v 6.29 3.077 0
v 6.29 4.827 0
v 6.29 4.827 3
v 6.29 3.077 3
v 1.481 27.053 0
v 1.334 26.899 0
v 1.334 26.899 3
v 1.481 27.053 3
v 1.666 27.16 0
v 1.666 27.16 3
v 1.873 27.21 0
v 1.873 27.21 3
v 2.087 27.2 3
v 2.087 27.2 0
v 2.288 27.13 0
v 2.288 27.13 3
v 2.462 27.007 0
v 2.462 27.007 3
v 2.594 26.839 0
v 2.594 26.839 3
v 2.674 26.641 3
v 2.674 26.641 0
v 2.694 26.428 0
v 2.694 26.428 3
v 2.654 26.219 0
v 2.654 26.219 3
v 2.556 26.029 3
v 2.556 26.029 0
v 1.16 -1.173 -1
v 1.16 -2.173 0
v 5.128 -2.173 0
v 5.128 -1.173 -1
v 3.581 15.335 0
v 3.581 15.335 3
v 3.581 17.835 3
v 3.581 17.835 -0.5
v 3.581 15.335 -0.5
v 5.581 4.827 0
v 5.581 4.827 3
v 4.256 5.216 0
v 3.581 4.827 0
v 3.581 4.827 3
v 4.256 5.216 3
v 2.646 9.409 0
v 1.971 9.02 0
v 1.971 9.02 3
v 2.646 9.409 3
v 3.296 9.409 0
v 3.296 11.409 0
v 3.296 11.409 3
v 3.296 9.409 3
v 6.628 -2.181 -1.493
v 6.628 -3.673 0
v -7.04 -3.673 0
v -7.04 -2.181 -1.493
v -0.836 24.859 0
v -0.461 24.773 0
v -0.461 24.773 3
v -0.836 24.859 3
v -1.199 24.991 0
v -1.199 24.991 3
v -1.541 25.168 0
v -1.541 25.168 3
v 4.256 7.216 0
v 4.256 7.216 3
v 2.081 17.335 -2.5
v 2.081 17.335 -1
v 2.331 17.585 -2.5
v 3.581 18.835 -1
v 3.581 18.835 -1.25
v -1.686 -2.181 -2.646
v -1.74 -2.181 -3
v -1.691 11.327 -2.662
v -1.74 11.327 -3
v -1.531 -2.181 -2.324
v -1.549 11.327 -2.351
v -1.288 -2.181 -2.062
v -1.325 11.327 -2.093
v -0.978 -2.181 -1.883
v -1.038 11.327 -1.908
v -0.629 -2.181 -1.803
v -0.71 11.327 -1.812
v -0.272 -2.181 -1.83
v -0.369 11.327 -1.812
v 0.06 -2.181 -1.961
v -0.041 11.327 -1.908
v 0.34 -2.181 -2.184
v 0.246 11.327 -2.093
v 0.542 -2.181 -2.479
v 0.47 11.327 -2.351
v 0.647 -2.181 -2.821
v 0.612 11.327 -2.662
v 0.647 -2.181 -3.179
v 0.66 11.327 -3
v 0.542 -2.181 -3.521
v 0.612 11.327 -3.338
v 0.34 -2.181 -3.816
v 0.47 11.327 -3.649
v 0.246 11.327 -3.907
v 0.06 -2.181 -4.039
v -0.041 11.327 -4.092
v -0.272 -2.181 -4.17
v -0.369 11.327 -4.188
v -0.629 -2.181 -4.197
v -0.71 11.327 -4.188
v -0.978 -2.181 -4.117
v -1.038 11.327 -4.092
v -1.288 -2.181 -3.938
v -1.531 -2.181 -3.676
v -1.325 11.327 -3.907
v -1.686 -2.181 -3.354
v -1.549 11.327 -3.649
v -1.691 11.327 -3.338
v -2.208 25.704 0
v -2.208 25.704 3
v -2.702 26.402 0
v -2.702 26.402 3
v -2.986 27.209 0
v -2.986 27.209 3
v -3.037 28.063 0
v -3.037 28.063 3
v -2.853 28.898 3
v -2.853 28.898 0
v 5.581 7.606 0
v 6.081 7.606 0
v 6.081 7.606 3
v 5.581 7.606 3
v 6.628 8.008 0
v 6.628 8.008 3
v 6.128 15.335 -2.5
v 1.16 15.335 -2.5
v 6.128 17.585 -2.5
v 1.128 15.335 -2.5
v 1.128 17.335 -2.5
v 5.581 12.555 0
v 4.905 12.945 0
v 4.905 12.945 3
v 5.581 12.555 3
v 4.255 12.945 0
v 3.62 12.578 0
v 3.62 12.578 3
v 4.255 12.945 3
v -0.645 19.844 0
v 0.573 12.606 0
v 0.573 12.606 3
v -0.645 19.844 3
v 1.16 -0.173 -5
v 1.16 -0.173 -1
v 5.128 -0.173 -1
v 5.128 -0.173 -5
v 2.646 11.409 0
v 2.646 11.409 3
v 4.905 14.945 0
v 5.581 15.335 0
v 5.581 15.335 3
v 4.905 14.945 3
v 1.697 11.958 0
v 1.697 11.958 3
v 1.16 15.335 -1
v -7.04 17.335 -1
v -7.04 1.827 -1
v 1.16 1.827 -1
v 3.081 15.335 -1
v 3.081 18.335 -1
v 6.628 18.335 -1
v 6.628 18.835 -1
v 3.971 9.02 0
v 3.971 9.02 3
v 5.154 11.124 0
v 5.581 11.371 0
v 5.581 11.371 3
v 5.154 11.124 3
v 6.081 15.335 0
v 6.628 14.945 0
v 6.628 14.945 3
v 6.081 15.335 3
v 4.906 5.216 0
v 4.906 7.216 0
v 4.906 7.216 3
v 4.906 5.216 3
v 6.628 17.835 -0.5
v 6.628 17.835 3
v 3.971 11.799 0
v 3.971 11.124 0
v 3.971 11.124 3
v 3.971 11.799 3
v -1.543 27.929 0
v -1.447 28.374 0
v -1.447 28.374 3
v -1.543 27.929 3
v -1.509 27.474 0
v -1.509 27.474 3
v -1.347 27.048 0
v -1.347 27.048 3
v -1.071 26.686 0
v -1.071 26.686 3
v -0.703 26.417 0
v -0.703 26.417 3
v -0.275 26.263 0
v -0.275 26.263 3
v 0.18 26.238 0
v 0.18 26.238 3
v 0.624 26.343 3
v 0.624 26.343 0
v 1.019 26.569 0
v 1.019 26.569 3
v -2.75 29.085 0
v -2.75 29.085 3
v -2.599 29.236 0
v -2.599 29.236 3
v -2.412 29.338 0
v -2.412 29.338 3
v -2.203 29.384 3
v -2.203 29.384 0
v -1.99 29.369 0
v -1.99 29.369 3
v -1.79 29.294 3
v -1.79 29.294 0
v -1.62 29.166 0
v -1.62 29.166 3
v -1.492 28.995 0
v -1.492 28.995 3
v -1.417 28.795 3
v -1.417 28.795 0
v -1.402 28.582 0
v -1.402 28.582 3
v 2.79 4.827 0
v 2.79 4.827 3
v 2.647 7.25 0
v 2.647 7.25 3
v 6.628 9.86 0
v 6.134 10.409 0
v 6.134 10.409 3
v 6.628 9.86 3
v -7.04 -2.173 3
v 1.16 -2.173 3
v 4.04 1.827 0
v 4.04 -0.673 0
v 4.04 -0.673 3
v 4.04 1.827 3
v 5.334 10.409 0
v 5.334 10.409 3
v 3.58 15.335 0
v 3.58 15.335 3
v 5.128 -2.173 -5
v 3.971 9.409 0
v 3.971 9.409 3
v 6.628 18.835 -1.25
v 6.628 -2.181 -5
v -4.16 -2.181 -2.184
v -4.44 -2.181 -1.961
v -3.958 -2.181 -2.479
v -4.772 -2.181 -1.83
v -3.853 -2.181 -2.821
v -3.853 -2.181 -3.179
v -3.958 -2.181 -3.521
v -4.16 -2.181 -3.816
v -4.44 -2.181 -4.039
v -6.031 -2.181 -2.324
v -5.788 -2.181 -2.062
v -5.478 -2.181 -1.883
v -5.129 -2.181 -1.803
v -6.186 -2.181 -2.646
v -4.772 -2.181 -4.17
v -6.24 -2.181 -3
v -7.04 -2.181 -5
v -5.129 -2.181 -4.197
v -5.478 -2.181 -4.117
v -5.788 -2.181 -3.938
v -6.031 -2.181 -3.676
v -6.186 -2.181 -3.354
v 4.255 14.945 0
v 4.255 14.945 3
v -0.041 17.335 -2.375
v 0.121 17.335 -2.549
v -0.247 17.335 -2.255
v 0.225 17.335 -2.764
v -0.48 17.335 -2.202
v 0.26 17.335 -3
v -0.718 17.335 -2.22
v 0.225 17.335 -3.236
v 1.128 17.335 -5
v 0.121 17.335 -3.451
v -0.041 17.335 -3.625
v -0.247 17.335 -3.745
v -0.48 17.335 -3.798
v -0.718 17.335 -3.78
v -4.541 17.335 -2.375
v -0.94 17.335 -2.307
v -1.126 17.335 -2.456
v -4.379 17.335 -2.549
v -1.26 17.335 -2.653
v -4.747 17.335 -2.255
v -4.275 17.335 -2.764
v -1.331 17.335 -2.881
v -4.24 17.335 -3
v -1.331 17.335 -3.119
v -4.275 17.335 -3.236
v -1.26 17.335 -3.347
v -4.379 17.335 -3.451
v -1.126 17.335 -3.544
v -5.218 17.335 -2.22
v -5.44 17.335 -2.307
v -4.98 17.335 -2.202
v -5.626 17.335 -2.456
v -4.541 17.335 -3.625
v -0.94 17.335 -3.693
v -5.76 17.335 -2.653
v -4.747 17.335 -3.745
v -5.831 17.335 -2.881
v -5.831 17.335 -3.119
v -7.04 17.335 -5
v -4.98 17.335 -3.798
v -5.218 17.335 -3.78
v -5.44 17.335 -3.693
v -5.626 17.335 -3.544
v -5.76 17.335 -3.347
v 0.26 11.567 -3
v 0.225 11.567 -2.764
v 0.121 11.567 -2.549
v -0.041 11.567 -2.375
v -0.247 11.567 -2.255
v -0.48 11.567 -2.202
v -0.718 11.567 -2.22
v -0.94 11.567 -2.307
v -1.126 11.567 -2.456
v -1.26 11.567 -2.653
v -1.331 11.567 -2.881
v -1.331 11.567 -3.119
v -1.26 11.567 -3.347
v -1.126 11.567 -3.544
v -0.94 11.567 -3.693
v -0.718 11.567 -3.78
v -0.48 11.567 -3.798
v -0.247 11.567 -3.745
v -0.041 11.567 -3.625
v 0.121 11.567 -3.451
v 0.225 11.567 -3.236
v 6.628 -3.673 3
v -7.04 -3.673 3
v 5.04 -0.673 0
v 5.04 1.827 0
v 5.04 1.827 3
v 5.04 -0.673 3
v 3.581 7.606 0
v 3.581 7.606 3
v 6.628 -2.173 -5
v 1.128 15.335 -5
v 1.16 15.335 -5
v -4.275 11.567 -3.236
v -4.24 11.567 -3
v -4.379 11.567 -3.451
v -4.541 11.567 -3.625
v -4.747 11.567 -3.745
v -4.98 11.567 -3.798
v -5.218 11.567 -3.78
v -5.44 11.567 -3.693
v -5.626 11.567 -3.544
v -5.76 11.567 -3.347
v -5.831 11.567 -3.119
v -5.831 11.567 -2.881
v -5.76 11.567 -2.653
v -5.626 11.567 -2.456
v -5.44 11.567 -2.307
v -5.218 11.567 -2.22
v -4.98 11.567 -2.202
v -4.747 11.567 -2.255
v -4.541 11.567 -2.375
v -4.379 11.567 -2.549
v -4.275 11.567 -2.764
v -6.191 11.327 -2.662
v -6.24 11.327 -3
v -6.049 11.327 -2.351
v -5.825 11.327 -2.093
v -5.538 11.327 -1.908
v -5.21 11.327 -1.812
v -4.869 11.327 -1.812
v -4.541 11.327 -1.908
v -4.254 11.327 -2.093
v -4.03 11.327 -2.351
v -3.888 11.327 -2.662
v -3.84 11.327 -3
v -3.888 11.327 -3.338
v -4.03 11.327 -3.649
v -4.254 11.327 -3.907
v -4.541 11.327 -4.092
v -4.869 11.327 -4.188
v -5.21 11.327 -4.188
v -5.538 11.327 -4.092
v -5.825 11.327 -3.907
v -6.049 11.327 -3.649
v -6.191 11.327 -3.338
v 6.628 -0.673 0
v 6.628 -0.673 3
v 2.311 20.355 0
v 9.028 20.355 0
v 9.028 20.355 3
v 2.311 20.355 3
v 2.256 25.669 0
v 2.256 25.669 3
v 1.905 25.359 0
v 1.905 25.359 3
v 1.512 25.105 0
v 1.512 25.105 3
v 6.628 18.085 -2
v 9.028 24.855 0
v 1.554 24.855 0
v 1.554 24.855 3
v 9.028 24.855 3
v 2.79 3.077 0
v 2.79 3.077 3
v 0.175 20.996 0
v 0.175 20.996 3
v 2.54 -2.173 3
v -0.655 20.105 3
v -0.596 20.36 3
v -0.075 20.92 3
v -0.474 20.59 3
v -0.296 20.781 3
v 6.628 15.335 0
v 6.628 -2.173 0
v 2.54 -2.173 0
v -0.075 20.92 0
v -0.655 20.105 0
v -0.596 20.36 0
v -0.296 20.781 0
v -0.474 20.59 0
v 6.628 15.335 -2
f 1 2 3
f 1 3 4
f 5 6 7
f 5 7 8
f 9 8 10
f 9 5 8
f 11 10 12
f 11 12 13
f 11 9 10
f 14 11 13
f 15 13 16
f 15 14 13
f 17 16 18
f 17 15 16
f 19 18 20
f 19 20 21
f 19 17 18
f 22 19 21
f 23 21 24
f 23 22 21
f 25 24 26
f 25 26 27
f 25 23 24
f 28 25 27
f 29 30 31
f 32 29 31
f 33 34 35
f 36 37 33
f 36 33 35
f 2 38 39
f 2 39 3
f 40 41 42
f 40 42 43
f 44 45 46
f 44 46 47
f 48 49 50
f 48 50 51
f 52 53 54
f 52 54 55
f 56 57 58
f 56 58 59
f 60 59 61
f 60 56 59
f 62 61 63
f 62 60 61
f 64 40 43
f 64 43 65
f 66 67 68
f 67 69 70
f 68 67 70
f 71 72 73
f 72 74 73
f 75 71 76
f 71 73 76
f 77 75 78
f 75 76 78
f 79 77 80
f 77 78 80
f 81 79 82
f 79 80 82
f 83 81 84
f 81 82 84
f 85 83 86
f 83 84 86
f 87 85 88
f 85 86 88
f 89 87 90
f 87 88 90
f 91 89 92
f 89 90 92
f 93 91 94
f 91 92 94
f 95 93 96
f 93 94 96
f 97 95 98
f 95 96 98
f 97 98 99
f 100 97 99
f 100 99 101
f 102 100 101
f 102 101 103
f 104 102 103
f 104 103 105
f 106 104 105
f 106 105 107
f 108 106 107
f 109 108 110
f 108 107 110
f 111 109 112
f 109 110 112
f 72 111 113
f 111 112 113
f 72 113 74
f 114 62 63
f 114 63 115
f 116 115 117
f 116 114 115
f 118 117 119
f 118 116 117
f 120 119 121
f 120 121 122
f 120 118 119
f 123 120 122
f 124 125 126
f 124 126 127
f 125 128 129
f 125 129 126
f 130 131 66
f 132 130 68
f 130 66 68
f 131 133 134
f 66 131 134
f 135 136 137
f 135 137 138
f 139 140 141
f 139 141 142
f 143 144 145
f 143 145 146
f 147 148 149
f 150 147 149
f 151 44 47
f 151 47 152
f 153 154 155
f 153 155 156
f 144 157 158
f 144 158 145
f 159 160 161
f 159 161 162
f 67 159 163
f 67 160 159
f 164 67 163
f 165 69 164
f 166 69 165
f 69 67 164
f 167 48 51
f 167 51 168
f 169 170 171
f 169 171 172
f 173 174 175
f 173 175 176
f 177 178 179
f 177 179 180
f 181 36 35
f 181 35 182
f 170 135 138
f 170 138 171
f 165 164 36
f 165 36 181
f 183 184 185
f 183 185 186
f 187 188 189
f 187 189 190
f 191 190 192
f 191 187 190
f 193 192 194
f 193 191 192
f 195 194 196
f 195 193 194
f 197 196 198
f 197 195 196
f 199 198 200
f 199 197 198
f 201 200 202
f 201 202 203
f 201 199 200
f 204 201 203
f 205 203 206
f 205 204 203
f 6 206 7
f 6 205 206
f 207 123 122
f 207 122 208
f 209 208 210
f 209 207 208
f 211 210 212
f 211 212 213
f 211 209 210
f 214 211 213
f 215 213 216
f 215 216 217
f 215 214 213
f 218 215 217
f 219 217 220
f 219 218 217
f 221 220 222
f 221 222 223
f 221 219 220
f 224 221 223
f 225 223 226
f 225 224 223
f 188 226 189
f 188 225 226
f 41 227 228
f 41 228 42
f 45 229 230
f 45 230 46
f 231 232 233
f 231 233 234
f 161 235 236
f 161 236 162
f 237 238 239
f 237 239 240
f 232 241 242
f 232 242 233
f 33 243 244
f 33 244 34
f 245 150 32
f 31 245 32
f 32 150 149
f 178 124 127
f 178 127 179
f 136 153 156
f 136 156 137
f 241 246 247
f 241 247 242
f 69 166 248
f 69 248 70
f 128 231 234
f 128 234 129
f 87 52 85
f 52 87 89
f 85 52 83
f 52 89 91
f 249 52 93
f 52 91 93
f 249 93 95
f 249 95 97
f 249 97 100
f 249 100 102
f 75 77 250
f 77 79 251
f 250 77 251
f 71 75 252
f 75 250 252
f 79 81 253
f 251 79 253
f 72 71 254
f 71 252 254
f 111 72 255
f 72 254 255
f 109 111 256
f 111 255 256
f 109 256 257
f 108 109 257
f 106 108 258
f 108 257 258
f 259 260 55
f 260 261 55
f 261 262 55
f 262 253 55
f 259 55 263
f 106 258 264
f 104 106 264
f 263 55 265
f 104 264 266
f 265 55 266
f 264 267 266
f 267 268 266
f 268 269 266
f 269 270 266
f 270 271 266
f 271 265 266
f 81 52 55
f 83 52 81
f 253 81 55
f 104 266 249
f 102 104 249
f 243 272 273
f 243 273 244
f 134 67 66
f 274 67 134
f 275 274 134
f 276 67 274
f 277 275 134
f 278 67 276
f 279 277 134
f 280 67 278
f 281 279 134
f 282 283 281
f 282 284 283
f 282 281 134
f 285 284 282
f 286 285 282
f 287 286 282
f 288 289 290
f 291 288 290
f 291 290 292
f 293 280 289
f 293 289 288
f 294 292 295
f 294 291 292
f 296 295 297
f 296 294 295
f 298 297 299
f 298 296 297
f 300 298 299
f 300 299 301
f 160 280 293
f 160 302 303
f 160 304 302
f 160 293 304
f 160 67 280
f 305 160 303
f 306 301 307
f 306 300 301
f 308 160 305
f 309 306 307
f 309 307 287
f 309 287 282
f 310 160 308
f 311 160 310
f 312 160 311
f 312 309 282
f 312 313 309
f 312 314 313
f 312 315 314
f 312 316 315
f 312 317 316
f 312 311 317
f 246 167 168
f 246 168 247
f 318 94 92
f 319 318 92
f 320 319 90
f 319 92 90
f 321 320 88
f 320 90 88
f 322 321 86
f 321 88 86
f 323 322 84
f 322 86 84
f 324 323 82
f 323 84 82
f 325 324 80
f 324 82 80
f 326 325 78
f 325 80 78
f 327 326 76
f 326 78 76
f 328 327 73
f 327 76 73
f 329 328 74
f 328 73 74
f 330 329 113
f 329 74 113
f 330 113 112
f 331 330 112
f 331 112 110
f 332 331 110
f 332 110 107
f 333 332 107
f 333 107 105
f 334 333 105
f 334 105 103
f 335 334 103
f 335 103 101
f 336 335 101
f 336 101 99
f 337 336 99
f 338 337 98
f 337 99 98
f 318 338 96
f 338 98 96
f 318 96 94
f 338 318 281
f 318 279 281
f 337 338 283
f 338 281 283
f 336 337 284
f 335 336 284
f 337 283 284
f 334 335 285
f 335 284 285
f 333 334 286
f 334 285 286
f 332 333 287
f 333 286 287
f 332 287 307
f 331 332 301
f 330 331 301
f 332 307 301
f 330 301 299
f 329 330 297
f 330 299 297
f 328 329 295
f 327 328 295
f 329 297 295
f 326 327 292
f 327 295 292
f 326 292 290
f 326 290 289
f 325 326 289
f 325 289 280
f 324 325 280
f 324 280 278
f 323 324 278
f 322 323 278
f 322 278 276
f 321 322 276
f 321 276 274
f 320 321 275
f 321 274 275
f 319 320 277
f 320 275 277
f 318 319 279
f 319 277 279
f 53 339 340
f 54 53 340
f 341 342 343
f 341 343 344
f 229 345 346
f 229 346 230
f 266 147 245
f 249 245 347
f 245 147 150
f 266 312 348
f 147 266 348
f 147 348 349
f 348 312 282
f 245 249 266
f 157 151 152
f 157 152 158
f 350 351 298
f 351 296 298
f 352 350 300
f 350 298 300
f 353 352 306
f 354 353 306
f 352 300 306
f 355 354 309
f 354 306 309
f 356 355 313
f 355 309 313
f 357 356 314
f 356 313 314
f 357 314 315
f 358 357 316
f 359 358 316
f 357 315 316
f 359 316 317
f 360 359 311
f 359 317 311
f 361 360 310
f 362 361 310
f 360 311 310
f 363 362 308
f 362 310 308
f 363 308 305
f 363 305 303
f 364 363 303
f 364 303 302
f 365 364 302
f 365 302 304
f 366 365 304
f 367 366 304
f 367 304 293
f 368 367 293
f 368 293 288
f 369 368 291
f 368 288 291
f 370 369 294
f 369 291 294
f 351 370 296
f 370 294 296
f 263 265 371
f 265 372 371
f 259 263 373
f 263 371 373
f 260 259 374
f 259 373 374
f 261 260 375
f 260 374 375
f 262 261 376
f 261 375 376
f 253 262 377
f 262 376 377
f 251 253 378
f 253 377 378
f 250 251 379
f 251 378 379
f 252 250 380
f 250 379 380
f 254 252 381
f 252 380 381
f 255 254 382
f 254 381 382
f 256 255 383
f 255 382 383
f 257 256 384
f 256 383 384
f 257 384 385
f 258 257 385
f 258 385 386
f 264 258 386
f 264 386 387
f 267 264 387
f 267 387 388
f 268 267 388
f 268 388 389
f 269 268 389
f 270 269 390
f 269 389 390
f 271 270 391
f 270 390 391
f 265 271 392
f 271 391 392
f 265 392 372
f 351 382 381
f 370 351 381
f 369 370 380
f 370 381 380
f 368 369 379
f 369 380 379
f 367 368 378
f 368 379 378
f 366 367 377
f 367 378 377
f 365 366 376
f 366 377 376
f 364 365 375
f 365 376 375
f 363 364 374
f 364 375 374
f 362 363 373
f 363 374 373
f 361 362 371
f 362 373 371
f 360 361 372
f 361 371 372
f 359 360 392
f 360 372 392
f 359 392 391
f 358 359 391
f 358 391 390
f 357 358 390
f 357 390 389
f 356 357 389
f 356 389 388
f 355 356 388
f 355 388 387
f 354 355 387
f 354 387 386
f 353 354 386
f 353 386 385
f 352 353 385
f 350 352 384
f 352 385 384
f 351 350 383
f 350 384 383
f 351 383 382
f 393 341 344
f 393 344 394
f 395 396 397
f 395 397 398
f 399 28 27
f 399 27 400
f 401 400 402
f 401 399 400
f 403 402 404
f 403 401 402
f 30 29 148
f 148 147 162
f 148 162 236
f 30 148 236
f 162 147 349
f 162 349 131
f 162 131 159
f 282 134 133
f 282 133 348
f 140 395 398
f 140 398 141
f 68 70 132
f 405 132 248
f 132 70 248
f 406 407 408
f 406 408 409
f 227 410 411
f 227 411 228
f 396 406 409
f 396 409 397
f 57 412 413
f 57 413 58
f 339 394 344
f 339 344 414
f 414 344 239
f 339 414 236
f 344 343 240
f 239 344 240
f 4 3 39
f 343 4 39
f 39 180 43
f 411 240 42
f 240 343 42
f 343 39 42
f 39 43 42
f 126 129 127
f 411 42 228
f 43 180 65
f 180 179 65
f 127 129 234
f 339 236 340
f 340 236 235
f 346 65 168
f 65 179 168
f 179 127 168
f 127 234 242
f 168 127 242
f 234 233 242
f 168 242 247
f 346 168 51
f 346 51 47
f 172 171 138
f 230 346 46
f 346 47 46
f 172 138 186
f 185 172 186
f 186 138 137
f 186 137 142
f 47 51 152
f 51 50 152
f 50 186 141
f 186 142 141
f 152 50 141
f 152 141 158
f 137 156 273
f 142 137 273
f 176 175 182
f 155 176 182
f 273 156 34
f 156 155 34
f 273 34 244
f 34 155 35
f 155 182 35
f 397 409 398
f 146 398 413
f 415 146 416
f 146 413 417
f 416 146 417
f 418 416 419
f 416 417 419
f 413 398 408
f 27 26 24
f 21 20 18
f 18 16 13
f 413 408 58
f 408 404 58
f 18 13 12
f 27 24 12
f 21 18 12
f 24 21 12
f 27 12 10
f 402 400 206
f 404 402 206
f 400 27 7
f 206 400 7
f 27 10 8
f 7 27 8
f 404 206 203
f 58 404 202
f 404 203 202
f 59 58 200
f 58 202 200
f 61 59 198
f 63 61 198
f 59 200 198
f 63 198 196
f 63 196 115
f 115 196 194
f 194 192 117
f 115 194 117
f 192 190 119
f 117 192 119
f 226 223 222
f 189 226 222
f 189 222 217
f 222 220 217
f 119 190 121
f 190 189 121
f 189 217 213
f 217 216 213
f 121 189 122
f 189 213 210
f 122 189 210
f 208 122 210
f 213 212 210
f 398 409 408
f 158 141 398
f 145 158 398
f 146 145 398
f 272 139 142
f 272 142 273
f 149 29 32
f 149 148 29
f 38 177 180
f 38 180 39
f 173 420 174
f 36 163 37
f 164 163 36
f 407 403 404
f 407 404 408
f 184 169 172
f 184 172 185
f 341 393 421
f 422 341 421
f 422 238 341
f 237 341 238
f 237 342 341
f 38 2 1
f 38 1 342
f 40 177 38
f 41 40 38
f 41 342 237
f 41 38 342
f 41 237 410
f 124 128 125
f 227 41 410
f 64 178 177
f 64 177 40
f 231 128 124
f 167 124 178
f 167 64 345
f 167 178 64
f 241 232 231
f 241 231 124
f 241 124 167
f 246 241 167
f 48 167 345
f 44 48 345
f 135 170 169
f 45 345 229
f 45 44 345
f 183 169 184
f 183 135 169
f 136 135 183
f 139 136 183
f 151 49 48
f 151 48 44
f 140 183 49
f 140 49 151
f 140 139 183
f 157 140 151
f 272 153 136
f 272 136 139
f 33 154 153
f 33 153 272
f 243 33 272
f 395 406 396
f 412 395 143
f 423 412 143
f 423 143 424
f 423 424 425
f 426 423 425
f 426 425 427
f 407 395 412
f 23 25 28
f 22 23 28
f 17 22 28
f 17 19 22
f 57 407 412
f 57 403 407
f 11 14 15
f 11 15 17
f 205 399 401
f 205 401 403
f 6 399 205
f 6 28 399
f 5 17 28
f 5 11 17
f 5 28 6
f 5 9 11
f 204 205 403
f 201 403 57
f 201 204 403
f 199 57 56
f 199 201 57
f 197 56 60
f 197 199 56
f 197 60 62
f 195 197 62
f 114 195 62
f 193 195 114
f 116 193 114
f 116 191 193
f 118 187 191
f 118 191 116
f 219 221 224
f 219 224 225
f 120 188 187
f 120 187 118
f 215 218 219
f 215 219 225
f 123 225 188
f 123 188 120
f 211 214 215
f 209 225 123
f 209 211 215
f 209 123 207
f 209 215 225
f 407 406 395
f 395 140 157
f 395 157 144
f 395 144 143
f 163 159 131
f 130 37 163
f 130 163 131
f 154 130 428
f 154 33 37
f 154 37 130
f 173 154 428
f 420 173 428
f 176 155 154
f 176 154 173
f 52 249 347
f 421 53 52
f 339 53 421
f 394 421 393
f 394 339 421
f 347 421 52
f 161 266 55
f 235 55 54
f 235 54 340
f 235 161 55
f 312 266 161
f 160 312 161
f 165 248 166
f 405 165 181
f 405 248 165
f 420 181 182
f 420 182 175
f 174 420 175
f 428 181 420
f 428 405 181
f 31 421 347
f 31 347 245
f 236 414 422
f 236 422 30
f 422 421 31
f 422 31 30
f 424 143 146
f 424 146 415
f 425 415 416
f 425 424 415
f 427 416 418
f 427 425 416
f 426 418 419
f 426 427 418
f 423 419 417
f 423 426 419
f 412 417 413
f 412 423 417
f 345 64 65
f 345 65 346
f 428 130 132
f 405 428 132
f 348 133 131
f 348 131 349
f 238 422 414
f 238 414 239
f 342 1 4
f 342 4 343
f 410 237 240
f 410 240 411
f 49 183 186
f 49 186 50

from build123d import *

# Parameters (mm, degrees)
BOSS_SWITCH_BODY_DEPTH                    = 3
SKETCH1_W                                 = 4.0875
SKETCH1_H                                 = 1.5
SKETCH1_W_2                               = 3.046903414
SKETCH1_H_2                               = 3.5
BOSS_FLANGE_WIDTH_DEPTH                   = 5
SKETCH2_W                                 = 4
SKETCH2_H                                 = 2
SKETCH2_W_2                               = 8
SKETCH2_H_2                               = 1.5
BOSS_FLANGE_HEIGHT_DEPTH                  = 10.620596586
CUT_UP_TO_DOWN_DERAILLEUR_CLEARANCE_REACH = 23.629
SKETCH10_W                                = 1.5
SKETCH10_H                                = 3
SKETCH17_W                                = 12.1675
SKETCH17_H                                = 4
BOSS_FLANGE_SUPPORT_DEPTH                 = 17.508325141
TAP_DRILL_FOR_M2X0_4_TAP1_D               = 1.6
M2_CLEARANCE_HOLE2_D                      = 2.4
M2_CLEARANCE_HOLE2_DEPTH                  = 15
M2_CLEARANCE_HOLE2_TIP                    = 0.721032743
CHAMFER_FLANGE_SUPPORT_SIZE               = 1.5
CHAMFER_FLANGE_SUPPORT_2_SIZE             = 1.5
SKETCH23_W                                = 7.349718646
SKETCH23_H                                = 15.508325141
CUT_GAP_FOR_PRINTING_DEPTH                = 32.000499688
CUT_WIDE_DERAILLEUR_CLEARANCE_DEPTH       = 33.195879702
CUT_WIDE_DERAILLEUR_CLEARANCE_DEPTH_BACK  = 4
SKETCH27_W                                = 2.5
SKETCH27_H                                = 3.5
CHAMFER9_SIZE                             = 1.25
SKETCH28_W                                = 3.046903414
SKETCH28_H                                = 1
CUT_EXTRUDE1_DEPTH                        = 1
CHAMFER10_SIZE                            = 0.5
CHAMFER_FLANGE_SUPPORT_3_SIZE             = 1
CUT_EXTRUDE2_DEPTH                        = 34.862828732
BOSS_EXTRUDE2_DEPTH                       = 8.2


with BuildPart() as part:
    # Sketch-SwitchBossUp → Boss-Switch Body (new body)
    with BuildSketch(Plane.XY):
        with BuildLine():
            Line((5.581091204, 12.554885442), (5.58109997, 11.370542897))
            Line((5.58109997, 11.370542897), (5.154266051, 11.12411022))
            Line((5.154266051, 11.12411022), (3.971266051, 11.12411022))
            Line((3.971266051, 11.12411022), (3.97126394, 11.79911022))
            Line((3.97126394, 11.79911022), (3.296271341, 11.409403061))
            Line((3.296271341, 11.409403061), (3.296271341, 9.409403061))
            Line((3.296271341, 9.409403061), (3.971278743, 9.019687356))
            Line((3.971278743, 9.019687356), (3.971278743, 9.409408058))
            Line((3.971278743, 9.409408058), (5.333511297, 10.40941814))
            Line((5.333511297, 10.40941814), (6.133511297, 10.409424062))
            Line((6.133511297, 10.409424062), (6.627976927, 9.860264345))
            Line((6.627976927, 9.860264345), (6.627976927, 8.007577878))
            Line((6.627976927, 8.007577878), (6.081127833, 7.606137899))
            Line((6.081127833, 7.606137899), (5.581127833, 7.606137899))
            Line((5.581127833, 7.606137899), (4.906138119, 7.216432406))
            Line((4.906138119, 7.216432406), (4.906138119, 5.216432406))
            Line((4.906138119, 5.216432406), (5.58114552, 4.826716701))
            Line((5.58114552, 4.826716701), (6.290476927, 4.826716701))
            Line((6.290476927, 4.826716701), (6.290476927, 3.076720436))
            Line((6.290476927, 3.076720436), (5.040476927, 1.826720436))
            Line((5.040476927, 1.826720436), (5.040476927, -0.673279564))
            Line((5.040476927, -0.673279564), (6.627976927, -0.673279564))
            Line((6.627976927, -0.673279564), (6.627976927, -3.673279564))
            Line((6.627976927, -3.673279564), (2.540476927, -3.673279564))
            Line((2.540476927, -3.673279564), (2.540476927, -2.173279564))
            Line((2.540476927, -2.173279564), (4.040476927, -0.673279564))
            Line((4.040476927, -0.673279564), (4.040476927, 1.826720436))
            Line((4.040476927, 1.826720436), (2.790476927, 3.076720436))
            Line((2.790476927, 3.076720436), (2.790476927, 4.826720436))
            Line((2.790476927, 4.826720436), (3.58114552, 4.826720436))
            Line((3.58114552, 4.826720436), (4.256138119, 5.216427595))
            Line((4.256138119, 5.216427595), (4.256138119, 7.216427595))
            Line((4.256138119, 7.216427595), (3.581130717, 7.6061433))
            Line((3.581130717, 7.6061433), (2.64686251, 7.249572244))
            Line((2.64686251, 7.249572244), (1.971281627, 9.019692757))
            Line((1.971281627, 9.019692757), (2.646271341, 9.40939825))
            Line((2.646271341, 9.40939825), (2.646271341, 11.40939825))
            Line((2.646271341, 11.40939825), (1.696557212, 11.957715958))
            Line((1.696557212, 11.957715958), (0.573317845, 12.60621851))
            Line((0.573317845, 12.60621851), (-0.645153605, 19.844362607))
            ThreePointArc((-0.645153605, 19.844362607), (-0.473707256, 20.590279886), (0.174966786, 20.996492176))
            Line((0.174966786, 20.996492176), (-0.46073685, 24.772792819))
            ThreePointArc((-0.46073685, 24.772792819), (-1.019582136, 24.919522879), (-1.541303694, 25.167805745))
            ThreePointArc((-1.541303694, 25.167805745), (-2.872284003, 26.795385437), (-2.852546321, 28.897797067))
            ThreePointArc((-2.852546321, 28.897797067), (-1.887813913, 29.338582026), (-1.447028953, 28.373849618))
            ThreePointArc((-1.447028953, 28.373849618), (-0.703448682, 26.416936722), (1.333779254, 26.898727173))
            ThreePointArc((1.333779254, 26.898727173), (2.379722745, 27.074801628), (2.555797201, 26.028858137))
            ThreePointArc((2.555797201, 26.028858137), (2.086504637, 25.507104397), (1.511513111, 25.104801997))
            Line((1.511513111, 25.104801997), (1.553598189, 24.854801997))
            Line((1.553598189, 24.854801997), (9.027976927, 24.854801997))
            Line((9.027976927, 24.854801997), (9.027976927, 22.354801997))
            Line((9.027976927, 22.354801997), (9.027976927, 20.354801997))
            Line((9.027976927, 20.354801997), (2.311129602, 20.354801997))
            Line((2.311129602, 20.354801997), (3.620242387, 12.578216848))
            Line((3.620242387, 12.578216848), (4.255457038, 12.944958198))
            Line((4.255457038, 12.944958198), (4.255457038, 14.944958198))
            Line((4.255457038, 14.944958198), (3.579805878, 15.335045577))
            Line((3.579805878, 15.335045577), (3.581073513, 15.335045577))
            Line((3.581073513, 15.335045577), (3.581073513, 17.835045577))
            Line((3.581073513, 17.835045577), (5.725580434, 17.835045577))
            Line((5.725580434, 17.835045577), (6.627976927, 17.835045577))
            Line((6.627976927, 17.835045577), (6.627976927, 14.94496801))
            Line((6.627976927, 14.94496801), (6.081099865, 15.335045577))
            Line((6.081099865, 15.335045577), (5.581099865, 15.335045577))
            Line((5.581099865, 15.335045577), (4.905457038, 14.944963009))
            Line((4.905457038, 14.944963009), (4.905457038, 12.944963009))
            Line((4.905457038, 12.944963009), (5.581091204, 12.554885442))
        make_face()
    extrude(amount=BOSS_SWITCH_BODY_DEPTH)

    # Sketch1 → Boss-Flange Width (add)
    with BuildSketch(Plane(origin=(0, 0, 0), x_dir=(-1, 0, 0), z_dir=(0, 0, -1))):
        with Locations((-4.584226927, -2.923279564)):
            Rectangle(SKETCH1_W, SKETCH1_H)
        with Locations((-5.10452522, 17.085045577)):
            Rectangle(SKETCH1_W_2, SKETCH1_H_2)
    extrude(amount=BOSS_FLANGE_WIDTH_DEPTH)

    # Sketch2 → Boss-Flange Height (add)
    with BuildSketch(Plane(origin=(-7.039523073, 0, 0), x_dir=(0, 0, -1), z_dir=(1, 0, 0))):
        with Locations((3, 16.335045577)):
            Rectangle(SKETCH2_W, SKETCH2_H)
        with Locations((1, -2.923279564)):
            Rectangle(SKETCH2_W_2, SKETCH2_H_2)
    extrude(amount=BOSS_FLANGE_HEIGHT_DEPTH)

    # Sketch10 → Cut-Up-To-Down Derailleur Clearance (cut, up to next)
    with BuildSketch(Plane(origin=(0, 15.335045577, 0), x_dir=(1, 0, 0), z_dir=(0, 1, 0)), mode=Mode.PRIVATE) as cut_up_to_down_derailleur_clearance_sk1:
        with Locations((5.877976927, 3.5)):
            Rectangle(SKETCH10_W, SKETCH10_H)
    cut_up_to_down_derailleur_clearance_tool1 = extrude(cut_up_to_down_derailleur_clearance_sk1.sketch, amount=CUT_UP_TO_DOWN_DERAILLEUR_CLEARANCE_REACH, mode=Mode.PRIVATE) & part.part
    add(cut_up_to_down_derailleur_clearance_tool1.solids().sort_by_distance((5.877977, 15.335046, -3.5))[0], mode=Mode.SUBTRACT)

    # Sketch17 → Boss-Flange Support (add)
    with BuildSketch(Plane.XZ.offset(-15.335045577)):
        with Locations((-0.955773073, -3)):
            Rectangle(SKETCH17_W, SKETCH17_H)
    extrude(amount=BOSS_FLANGE_SUPPORT_DEPTH)

    # Tap Drill for M2x0.4 Tap1 (through all)
    with Locations(Plane(origin=(0, -3.673279564, 0), x_dir=(-1, 0, 0), z_dir=(0, -1, 0))):
        with Locations((5.039523073, 3), (0.539523073, 3)):
            Hole(TAP_DRILL_FOR_M2X0_4_TAP1_D / 2)

    # M2 Clearance Hole2
    with Locations(Plane.XZ.offset(3.673279564)):
        with Locations((-5.039523073, -3), (-0.539523073, -3)):
            Hole(M2_CLEARANCE_HOLE2_D / 2, depth=M2_CLEARANCE_HOLE2_DEPTH)
            with Locations((0, 0, -(M2_CLEARANCE_HOLE2_DEPTH + M2_CLEARANCE_HOLE2_TIP / 2))):  # 118° drill point
                Cone(0, M2_CLEARANCE_HOLE2_D / 2, M2_CLEARANCE_HOLE2_TIP, mode=Mode.SUBTRACT)

    # Chamfer-Flange Support
    chamfer_flange_support_edges = [part.edges().sort_by_distance(p)[0] for p in [
        (3.581073513, 17.335045577, -3),
    ]]
    chamfer(chamfer_flange_support_edges, length=CHAMFER_FLANGE_SUPPORT_SIZE - 0.0001)  # a hair under: the kernel refuses the full size

    # Chamfer-Flange Support 2
    chamfer_flange_support_2_edges = [part.edges().sort_by_distance(p)[0] for p in [
        (5.127976927, 17.085045577, -2),
        (5.127976927, 15.335045577, -1.5),
    ]]
    chamfer(chamfer_flange_support_2_edges, length=CHAMFER_FLANGE_SUPPORT_2_SIZE - 0.0001)  # a hair under: the kernel refuses the full size

    # Sketch23 → Cut-Gap for Printing (cut, through all)
    with BuildSketch(Plane.XY.offset(-1)):
        with Locations((4.83533625, 7.580883007)):
            Rectangle(SKETCH23_W, SKETCH23_H)
    extrude(amount=-CUT_GAP_FOR_PRINTING_DEPTH, mode=Mode.SUBTRACT)

    # Sketch27 → Cut-Wide Derailleur Clearance (cut, two sides: drawn at the far end of the back side and taken through both)
    with BuildSketch(Plane(origin=(5.127976927, 0, 0), x_dir=(0, 0, -1), z_dir=(1, 0, 0)).offset(-CUT_WIDE_DERAILLEUR_CLEARANCE_DEPTH_BACK)):
        with Locations((3.75, 17.085045577)):
            Rectangle(SKETCH27_W, SKETCH27_H)
    extrude(amount=CUT_WIDE_DERAILLEUR_CLEARANCE_DEPTH + CUT_WIDE_DERAILLEUR_CLEARANCE_DEPTH_BACK, mode=Mode.SUBTRACT)

    # Chamfer9
    chamfer9_edges = [part.edges().sort_by_distance(p)[0] for p in [
        (4.85447522, 18.835045577, -2.5),
    ]]
    chamfer(chamfer9_edges, length=CHAMFER9_SIZE)

    # Sketch28 → Cut-Extrude1 (cut)
    with BuildSketch(Plane.XY.offset(-1)):
        with Locations((5.10452522, 18.335045577)):
            Rectangle(SKETCH28_W, SKETCH28_H)
    extrude(amount=CUT_EXTRUDE1_DEPTH, mode=Mode.SUBTRACT)

    # Chamfer10
    chamfer10_edges = [part.edges().sort_by_distance(p)[0] for p in [
        (3.581073513, 16.335045577, -1),
        (5.10452522, 17.835045577, -1),
    ]]
    chamfer(chamfer10_edges, length=CHAMFER10_SIZE - 0.0001)  # a hair under: the kernel refuses the full size

    # Chamfer-Flange Support 3
    chamfer_flange_support_3_edges = [part.edges().sort_by_distance(p)[0] for p in [
        (-0.955773073, -2.173279564, -1),
    ]]
    chamfer(chamfer_flange_support_3_edges, length=CHAMFER_FLANGE_SUPPORT_3_SIZE - 0.0001)  # a hair under: the kernel refuses the full size

    # Sketch31 → Cut-Extrude2 (cut, through all)
    with BuildSketch(Plane.ZY.offset(7.039523073)):
        Polygon((-5, -2.180661432), (-5, -3.673279564), (0, -3.673279564), (-1.492618132, -2.180661432), align=None)
    extrude(amount=-CUT_EXTRUDE2_DEPTH, mode=Mode.SUBTRACT)

    # Sketch32 → Boss-Extrude2 (add)
    with BuildSketch(Plane.ZY.offset(7.039523073)):
        Polygon((3, -2.173279564), (-1, 1.826720436), (-1, -2.082793031), (0.406297605, -3.355496176), (3, -3.355496176), align=None)
    extrude(amount=-BOSS_EXTRUDE2_DEPTH)


solid = part.part
